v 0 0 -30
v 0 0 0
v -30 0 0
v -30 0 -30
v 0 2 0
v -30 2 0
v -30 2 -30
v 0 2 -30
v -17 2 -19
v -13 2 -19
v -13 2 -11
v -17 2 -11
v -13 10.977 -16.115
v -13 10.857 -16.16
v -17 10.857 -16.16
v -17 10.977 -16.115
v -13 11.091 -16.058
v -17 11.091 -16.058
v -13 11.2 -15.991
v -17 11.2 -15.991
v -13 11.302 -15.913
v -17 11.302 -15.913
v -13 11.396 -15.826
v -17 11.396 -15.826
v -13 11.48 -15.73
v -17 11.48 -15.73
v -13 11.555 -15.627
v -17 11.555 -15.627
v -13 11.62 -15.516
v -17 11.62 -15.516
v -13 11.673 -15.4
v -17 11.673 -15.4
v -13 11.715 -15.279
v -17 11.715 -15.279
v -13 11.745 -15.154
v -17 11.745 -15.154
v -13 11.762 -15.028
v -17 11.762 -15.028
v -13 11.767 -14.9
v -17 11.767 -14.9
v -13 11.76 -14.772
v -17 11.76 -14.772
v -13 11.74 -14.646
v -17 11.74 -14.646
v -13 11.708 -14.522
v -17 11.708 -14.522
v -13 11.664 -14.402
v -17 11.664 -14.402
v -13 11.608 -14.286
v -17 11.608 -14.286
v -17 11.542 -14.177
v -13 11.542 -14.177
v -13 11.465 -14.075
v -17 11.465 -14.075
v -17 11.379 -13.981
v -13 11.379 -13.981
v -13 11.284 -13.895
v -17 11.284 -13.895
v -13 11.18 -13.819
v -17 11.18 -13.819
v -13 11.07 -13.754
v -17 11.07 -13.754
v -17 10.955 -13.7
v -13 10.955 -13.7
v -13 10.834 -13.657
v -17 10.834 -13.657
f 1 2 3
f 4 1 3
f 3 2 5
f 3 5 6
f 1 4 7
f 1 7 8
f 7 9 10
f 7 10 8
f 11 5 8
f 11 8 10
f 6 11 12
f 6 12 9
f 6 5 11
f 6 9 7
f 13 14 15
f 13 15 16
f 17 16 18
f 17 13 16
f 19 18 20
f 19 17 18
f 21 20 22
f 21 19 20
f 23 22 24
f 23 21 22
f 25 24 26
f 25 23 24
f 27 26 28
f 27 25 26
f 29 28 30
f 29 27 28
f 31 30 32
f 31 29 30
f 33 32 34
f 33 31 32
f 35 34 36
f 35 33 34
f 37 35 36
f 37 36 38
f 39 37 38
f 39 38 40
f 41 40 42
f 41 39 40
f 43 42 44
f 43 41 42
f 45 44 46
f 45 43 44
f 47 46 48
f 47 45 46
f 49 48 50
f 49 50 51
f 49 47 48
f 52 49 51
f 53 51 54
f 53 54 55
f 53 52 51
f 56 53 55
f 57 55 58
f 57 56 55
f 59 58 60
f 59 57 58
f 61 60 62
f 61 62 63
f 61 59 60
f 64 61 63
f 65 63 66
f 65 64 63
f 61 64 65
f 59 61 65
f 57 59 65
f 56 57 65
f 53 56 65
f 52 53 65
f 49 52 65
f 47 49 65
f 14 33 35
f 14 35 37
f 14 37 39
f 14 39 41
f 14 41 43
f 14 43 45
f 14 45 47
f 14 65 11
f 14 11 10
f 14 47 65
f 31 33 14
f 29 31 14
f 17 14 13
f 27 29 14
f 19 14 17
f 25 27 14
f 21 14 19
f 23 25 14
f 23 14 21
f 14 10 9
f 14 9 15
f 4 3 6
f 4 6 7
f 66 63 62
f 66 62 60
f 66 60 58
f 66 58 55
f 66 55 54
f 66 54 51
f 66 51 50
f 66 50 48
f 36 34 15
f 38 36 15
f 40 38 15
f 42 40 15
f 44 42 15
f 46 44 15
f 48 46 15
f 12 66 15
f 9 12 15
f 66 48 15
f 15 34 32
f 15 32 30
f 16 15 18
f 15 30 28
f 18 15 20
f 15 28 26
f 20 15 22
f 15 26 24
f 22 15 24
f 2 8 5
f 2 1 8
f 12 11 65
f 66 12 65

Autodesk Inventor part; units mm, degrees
ref_plane "YZ Plane" through (0, 0, 0) normal (1, 0, 0) x (0, 1, 0)
ref_plane "XZ Plane" through (0, 0, 0) normal (0, 1, 0) x (-1, 0, 0)
ref_plane "XY Plane" through (0, 0, 0) normal (0, 0, 1) x (1, 0, 0)
sketch "Sketch1" plane through (0, 0, 0) normal (0, 1, 0) x (-1, 0, 0)
  line L0 (0, 0) -> (30, 0)
  line L1 (30, 0) -> (30, -30)
  line L2 (30, -30) -> (0, -30)
  line L3 (0, -30) -> (0, 0)
  dimension "d0" = 30
  dimension "d1" = 30
extrude "Extrusion1" add sketch "Sketch1" along normal blind 2
ref_plane "Work Plane1" through (-13, 0, 0) normal (1, 0, 0) x (0, 0, -1)
sketch "Sketch2" plane through (-13, 0, 0) normal (1, 0, 0) x (0, 0, -1)
  line L0 (30, 2) -> (0, 2) projected
  line L1 (19, 2) -> (16.1597, 10.8569)
  line L2 (11, 2) -> (13.6568, 10.8341)
  arc A0 (16.1597, 10.8569) -> (13.6568, 10.8341) centre (14.9118, 10.4567) ccw
  line L3 (0, 0) -> (0, 2) projected
  dimension "d5" = 11
  dimension "d6" = 8
extrude "Extrusion2" add sketch "Sketch2" against normal blind 4
properties part number "servo-mount"
